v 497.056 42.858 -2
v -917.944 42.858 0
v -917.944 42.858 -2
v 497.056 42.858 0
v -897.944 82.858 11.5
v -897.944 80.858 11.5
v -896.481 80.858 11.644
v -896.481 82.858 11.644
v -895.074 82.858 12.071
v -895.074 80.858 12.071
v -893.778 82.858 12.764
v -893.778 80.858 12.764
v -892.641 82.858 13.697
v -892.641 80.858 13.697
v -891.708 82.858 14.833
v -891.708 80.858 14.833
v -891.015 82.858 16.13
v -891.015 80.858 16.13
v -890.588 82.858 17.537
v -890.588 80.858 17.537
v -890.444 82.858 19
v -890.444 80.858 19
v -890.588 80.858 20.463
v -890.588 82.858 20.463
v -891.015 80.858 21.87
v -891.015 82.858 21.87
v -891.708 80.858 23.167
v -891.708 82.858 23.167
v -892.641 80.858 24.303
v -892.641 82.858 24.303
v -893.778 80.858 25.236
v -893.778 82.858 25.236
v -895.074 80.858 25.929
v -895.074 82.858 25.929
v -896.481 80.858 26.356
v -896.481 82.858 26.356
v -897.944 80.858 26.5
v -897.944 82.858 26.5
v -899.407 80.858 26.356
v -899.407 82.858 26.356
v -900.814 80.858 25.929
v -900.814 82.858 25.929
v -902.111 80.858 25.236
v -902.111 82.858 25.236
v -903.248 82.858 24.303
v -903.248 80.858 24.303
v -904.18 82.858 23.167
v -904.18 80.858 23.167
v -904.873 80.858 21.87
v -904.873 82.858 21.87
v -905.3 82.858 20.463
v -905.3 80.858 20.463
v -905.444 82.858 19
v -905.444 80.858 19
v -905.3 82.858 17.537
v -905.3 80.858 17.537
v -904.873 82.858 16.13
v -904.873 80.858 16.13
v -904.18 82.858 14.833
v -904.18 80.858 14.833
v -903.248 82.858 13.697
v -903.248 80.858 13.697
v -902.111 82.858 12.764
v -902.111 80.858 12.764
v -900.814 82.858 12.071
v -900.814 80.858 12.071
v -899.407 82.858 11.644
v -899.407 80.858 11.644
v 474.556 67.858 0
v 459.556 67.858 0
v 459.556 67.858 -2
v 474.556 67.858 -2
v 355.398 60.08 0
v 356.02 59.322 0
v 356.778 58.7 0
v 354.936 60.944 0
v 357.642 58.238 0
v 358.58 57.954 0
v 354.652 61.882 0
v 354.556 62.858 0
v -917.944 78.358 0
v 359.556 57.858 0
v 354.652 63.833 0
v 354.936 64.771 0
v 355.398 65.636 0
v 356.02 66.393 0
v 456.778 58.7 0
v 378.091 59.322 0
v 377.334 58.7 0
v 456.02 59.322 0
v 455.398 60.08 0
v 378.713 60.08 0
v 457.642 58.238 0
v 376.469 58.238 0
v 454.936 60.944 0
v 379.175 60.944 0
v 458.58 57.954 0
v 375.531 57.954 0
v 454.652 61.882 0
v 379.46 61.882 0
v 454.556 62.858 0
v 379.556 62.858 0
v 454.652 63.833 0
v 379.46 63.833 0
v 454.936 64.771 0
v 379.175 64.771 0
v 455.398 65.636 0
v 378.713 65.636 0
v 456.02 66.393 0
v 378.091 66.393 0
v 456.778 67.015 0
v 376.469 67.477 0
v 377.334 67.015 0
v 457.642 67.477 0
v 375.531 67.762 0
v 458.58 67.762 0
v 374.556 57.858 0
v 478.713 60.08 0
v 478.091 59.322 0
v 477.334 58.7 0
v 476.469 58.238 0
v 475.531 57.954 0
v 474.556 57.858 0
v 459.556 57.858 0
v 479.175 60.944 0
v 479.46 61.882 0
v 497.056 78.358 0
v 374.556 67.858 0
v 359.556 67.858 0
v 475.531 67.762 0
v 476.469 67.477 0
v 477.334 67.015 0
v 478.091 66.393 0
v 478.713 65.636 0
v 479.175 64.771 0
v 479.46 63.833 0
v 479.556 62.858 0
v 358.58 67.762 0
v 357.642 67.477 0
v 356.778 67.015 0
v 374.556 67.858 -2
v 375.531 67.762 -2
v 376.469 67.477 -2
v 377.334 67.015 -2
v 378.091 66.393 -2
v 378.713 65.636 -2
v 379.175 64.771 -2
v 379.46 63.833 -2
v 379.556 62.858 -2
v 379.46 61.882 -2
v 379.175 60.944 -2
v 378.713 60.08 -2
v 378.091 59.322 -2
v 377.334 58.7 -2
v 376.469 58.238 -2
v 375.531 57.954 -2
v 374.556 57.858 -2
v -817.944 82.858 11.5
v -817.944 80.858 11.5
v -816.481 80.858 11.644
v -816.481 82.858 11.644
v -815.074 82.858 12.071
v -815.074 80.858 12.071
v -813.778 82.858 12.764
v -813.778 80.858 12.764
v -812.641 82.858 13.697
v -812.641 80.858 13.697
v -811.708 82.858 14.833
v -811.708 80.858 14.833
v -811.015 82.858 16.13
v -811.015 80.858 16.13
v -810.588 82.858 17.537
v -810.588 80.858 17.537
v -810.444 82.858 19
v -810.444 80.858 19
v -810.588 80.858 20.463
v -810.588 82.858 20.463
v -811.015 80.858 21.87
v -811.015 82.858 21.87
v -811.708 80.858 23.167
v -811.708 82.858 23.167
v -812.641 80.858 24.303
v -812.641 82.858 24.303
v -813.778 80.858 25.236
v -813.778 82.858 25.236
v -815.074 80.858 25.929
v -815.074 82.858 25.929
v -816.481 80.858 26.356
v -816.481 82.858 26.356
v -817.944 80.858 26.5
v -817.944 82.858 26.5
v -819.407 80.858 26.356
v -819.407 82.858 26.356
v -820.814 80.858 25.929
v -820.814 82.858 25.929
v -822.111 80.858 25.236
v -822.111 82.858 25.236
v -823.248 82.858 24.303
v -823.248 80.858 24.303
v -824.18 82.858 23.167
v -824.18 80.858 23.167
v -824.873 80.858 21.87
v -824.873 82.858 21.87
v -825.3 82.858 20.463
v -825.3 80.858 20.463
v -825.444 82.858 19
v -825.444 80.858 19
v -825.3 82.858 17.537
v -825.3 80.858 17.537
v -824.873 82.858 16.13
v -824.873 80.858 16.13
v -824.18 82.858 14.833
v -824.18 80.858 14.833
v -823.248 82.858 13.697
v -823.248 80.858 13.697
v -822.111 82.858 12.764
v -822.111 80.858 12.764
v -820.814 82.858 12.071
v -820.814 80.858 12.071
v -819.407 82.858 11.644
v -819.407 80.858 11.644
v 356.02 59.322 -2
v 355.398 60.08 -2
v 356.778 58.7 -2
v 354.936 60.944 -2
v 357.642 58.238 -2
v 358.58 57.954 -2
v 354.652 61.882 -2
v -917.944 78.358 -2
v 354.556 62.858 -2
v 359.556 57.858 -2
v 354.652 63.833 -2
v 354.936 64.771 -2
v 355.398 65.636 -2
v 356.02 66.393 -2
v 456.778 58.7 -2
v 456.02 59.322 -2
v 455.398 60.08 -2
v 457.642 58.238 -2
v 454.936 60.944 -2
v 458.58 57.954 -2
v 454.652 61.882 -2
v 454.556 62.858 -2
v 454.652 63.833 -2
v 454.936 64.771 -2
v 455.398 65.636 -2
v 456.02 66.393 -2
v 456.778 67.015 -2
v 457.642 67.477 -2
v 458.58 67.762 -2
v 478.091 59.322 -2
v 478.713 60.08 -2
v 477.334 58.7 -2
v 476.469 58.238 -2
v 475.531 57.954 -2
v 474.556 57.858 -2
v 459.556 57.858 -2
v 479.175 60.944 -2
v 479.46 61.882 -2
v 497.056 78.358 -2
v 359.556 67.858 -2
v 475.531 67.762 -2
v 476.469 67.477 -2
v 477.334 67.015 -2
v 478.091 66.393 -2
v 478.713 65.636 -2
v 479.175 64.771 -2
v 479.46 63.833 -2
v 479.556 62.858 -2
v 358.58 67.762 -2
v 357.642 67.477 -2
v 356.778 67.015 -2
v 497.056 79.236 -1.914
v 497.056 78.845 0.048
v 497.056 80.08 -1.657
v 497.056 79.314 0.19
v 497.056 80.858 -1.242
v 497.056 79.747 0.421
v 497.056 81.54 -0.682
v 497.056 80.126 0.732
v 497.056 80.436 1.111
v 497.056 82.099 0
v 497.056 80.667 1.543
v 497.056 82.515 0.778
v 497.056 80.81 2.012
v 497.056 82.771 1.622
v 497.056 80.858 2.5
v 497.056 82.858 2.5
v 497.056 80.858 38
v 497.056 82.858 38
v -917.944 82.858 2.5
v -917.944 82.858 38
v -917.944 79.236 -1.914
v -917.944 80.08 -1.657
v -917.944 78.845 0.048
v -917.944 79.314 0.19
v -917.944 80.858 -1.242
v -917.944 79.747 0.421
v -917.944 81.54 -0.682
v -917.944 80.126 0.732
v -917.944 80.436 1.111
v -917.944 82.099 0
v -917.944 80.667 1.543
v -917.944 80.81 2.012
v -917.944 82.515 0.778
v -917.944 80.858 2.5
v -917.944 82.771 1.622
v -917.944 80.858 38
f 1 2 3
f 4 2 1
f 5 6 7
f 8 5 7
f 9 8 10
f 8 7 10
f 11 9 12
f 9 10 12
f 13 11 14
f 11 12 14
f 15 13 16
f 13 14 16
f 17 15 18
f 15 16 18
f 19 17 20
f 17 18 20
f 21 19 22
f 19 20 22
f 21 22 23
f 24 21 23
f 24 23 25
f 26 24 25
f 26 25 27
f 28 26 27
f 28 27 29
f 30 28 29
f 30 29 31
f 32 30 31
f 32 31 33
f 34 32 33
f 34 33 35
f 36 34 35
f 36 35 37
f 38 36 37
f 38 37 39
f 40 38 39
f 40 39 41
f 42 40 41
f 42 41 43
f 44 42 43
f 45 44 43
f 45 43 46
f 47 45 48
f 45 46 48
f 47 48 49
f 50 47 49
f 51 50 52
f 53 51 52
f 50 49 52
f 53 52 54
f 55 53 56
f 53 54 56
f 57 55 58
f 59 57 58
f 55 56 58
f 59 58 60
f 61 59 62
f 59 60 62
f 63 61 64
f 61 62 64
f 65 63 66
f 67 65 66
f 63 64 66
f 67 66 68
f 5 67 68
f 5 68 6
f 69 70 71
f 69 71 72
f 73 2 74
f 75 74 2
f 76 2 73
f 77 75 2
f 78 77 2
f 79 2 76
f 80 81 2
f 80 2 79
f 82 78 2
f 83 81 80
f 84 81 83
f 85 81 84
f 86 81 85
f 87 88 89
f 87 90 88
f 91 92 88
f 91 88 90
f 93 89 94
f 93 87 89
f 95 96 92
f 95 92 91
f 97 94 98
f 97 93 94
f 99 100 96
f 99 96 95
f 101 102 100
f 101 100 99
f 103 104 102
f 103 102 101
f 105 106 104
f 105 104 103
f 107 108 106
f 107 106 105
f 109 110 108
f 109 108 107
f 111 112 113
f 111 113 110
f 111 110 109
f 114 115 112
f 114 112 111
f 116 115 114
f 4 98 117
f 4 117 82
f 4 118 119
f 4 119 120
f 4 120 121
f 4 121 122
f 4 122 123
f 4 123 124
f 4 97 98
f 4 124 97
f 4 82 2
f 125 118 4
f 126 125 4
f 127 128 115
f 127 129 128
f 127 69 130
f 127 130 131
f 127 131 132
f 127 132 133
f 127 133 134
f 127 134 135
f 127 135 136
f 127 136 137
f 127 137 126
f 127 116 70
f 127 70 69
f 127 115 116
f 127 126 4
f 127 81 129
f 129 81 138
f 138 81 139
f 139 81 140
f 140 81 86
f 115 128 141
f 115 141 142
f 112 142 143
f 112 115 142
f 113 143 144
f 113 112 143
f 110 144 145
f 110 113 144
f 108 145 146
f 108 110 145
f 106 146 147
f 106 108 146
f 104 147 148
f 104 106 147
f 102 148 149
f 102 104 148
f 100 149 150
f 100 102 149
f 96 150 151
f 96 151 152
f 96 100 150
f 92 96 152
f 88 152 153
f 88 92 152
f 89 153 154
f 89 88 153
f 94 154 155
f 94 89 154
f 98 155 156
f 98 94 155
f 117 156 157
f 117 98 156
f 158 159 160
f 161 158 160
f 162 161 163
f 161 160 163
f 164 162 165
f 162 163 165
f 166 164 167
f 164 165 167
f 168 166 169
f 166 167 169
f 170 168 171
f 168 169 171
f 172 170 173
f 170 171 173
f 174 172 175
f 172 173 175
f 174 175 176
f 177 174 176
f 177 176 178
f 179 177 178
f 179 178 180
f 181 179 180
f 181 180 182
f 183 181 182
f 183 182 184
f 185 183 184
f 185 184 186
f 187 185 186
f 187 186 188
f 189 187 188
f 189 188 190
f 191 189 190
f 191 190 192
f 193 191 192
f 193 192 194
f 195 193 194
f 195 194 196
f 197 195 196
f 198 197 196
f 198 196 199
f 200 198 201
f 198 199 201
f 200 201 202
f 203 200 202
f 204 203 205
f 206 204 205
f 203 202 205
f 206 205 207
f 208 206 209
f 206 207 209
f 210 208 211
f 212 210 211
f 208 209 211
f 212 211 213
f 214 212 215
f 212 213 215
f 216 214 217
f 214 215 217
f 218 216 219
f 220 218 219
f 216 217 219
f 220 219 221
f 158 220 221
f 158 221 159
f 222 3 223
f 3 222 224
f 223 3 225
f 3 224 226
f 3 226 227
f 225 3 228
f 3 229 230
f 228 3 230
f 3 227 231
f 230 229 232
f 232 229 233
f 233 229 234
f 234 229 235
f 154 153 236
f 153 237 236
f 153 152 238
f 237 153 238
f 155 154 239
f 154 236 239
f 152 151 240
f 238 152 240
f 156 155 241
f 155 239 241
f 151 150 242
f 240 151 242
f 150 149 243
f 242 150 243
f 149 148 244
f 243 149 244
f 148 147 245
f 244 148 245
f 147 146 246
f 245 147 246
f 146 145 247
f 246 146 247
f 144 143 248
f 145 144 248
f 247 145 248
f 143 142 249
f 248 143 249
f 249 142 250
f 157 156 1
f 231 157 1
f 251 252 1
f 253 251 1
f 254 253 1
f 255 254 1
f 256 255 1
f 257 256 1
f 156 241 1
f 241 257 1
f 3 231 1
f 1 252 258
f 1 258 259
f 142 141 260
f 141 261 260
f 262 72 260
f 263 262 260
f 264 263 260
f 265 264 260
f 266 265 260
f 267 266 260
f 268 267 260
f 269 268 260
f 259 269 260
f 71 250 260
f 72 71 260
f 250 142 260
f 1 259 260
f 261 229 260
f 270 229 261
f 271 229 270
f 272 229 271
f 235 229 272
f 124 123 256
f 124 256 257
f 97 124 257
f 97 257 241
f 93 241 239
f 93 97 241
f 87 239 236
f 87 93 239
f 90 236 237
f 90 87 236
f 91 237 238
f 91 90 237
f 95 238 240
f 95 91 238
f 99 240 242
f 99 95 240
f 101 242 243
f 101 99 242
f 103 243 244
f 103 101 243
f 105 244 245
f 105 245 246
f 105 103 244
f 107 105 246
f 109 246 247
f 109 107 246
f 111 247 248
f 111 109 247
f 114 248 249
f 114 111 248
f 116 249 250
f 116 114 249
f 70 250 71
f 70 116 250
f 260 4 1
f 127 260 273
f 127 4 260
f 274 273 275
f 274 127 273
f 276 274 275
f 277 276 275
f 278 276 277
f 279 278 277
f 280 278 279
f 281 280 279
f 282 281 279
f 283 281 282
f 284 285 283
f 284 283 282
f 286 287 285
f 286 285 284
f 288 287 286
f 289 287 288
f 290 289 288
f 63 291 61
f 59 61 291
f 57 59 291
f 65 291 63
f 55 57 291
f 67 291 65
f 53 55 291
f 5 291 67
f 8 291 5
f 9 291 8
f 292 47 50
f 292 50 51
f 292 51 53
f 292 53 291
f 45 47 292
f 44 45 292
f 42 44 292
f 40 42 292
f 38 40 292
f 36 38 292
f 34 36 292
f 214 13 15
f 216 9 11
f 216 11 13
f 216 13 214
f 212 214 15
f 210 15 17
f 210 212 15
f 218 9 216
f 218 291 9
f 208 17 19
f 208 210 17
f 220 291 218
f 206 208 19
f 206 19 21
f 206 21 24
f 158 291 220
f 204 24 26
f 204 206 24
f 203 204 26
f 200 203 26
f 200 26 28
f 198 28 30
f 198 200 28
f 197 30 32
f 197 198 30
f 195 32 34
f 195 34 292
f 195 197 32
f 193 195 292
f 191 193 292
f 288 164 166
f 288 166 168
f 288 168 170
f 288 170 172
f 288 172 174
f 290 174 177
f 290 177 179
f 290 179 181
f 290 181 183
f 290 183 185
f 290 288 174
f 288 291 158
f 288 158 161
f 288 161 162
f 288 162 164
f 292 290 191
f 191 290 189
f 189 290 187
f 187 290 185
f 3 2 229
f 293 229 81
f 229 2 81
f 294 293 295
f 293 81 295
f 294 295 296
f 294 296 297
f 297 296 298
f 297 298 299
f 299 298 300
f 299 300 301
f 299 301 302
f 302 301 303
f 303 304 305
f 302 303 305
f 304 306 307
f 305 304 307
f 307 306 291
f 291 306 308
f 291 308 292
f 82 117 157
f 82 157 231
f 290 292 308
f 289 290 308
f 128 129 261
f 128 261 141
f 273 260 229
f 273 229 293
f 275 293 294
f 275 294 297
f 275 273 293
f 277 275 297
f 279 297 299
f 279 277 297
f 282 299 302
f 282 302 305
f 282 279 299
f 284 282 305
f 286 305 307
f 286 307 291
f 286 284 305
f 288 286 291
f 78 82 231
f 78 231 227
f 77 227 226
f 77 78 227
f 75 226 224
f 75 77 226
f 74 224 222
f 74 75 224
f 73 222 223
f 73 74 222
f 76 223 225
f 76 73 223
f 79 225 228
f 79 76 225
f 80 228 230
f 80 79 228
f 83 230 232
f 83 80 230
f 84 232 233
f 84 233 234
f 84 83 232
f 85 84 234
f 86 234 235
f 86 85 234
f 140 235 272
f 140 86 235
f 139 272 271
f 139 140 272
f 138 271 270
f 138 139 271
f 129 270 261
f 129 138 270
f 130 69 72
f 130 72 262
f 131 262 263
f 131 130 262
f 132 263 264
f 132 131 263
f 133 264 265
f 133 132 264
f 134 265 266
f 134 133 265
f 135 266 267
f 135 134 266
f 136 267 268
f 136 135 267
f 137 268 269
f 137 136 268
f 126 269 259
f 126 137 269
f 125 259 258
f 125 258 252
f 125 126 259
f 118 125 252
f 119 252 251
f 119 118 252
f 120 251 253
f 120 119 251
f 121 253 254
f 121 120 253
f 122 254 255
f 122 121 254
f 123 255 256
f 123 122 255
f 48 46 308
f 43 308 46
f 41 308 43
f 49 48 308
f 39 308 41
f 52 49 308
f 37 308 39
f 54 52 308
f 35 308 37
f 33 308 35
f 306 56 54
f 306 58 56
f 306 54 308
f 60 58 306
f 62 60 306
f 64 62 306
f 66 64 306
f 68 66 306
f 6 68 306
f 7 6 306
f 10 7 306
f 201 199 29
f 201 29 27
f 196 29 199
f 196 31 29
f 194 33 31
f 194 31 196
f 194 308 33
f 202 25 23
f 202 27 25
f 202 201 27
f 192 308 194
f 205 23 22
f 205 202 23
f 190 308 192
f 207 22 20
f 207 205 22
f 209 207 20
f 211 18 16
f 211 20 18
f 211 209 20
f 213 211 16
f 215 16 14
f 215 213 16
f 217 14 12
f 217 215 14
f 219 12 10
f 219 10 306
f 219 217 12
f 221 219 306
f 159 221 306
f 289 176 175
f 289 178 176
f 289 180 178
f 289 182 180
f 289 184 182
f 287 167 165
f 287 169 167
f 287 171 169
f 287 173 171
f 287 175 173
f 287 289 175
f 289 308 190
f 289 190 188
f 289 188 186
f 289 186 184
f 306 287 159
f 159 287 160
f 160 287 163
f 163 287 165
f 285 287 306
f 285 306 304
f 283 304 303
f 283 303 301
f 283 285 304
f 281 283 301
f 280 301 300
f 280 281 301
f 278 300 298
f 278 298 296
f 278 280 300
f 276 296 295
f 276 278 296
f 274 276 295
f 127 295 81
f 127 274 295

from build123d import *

# Parameters (mm, degrees)
SKETCH1_W                    = 1415
SKETCH1_H                    = 40
BASE_FLANGE1_DEPTH           = 2
EDGE_FLANGE1_STRIP_W         = 13
EDGE_FLANGE1_STRIP_H         = 2
EDGE_FLANGE1_STRIP_CUT_DEPTH = 1415
EDGE_FLANGE1_DEPTH           = 1415
SKETCH9_R                    = 7.5
CUT_EXTRUDE1_DEPTH           = 920.516022359


# Sheet-metal steps are written as plain solids
with BuildPart() as part:
    # Sketch1 → Base-Flange1 (new body)
    with BuildSketch(Plane.XY):
        with Locations((-210.444287729, 62.85774027)):
            Rectangle(SKETCH1_W, SKETCH1_H)
        with BuildLine():
            Line((474.555712271, 57.85774027), (459.555712271, 57.85774027))
            ThreePointArc((459.555712271, 57.85774027), (454.555712271, 62.85774027), (459.555712271, 67.85774027))
            Line((459.555712271, 67.85774027), (474.555712271, 67.85774027))
            ThreePointArc((474.555712271, 67.85774027), (479.555712271, 62.85774027), (474.555712271, 57.85774027))
        make_face(mode=Mode.SUBTRACT)
        with BuildLine():
            Line((374.555712271, 57.85774027), (359.555712271, 57.85774027))
            ThreePointArc((359.555712271, 57.85774027), (354.555712271, 62.85774027), (359.555712271, 67.85774027))
            Line((359.555712271, 67.85774027), (374.555712271, 67.85774027))
            ThreePointArc((374.555712271, 67.85774027), (379.555712271, 62.85774027), (374.555712271, 57.85774027))
        make_face(mode=Mode.SUBTRACT)
    extrude(amount=-BASE_FLANGE1_DEPTH)

    # Edge-Flange1 strip (across the edge) → Edge-Flange1 strip cut (cut)
    with BuildSketch(Plane(origin=(497.055712271, 82.85774027, 0), x_dir=(0, -1, 0), z_dir=(-1, 0, 0))):
        with Locations((-2, -1)):
            Rectangle(EDGE_FLANGE1_STRIP_W, EDGE_FLANGE1_STRIP_H)
    extrude(amount=EDGE_FLANGE1_STRIP_CUT_DEPTH, mode=Mode.SUBTRACT)

    # Edge-Flange1 section (across the edge) → Edge-Flange1 (add)
    with BuildSketch(Plane(origin=(497.055712271, 82.85774027, 0), x_dir=(0, -1, 0), z_dir=(-1, 0, 0))):
        with BuildLine():
            Line((0, 2.5), (0, 38))
            Line((0, 38), (2, 38))
            Line((2, 38), (2, 2.5))
            ThreePointArc((2, 2.5), (2.732233047, 0.732233047), (4.5, 0))
            Line((4.5, 0), (4.5, -2))
            ThreePointArc((4.5, -2), (1.318019485, -0.681980515), (0, 2.5))
        make_face()
    extrude(amount=EDGE_FLANGE1_DEPTH)

    # Sketch9 → Cut-Extrude1 (cut, through all)
    with BuildSketch(Plane.XZ.offset(-80.85774027)):
        with Locations(Location((-897.944287729, 19, 0), (0, 0, 270))):
            Circle(SKETCH9_R)
        with Locations(Location((-817.944287729, 19, 0), (0, 0, 270))):
            Circle(SKETCH9_R)
    extrude(amount=-CUT_EXTRUDE1_DEPTH, mode=Mode.SUBTRACT)


solid = part.part
